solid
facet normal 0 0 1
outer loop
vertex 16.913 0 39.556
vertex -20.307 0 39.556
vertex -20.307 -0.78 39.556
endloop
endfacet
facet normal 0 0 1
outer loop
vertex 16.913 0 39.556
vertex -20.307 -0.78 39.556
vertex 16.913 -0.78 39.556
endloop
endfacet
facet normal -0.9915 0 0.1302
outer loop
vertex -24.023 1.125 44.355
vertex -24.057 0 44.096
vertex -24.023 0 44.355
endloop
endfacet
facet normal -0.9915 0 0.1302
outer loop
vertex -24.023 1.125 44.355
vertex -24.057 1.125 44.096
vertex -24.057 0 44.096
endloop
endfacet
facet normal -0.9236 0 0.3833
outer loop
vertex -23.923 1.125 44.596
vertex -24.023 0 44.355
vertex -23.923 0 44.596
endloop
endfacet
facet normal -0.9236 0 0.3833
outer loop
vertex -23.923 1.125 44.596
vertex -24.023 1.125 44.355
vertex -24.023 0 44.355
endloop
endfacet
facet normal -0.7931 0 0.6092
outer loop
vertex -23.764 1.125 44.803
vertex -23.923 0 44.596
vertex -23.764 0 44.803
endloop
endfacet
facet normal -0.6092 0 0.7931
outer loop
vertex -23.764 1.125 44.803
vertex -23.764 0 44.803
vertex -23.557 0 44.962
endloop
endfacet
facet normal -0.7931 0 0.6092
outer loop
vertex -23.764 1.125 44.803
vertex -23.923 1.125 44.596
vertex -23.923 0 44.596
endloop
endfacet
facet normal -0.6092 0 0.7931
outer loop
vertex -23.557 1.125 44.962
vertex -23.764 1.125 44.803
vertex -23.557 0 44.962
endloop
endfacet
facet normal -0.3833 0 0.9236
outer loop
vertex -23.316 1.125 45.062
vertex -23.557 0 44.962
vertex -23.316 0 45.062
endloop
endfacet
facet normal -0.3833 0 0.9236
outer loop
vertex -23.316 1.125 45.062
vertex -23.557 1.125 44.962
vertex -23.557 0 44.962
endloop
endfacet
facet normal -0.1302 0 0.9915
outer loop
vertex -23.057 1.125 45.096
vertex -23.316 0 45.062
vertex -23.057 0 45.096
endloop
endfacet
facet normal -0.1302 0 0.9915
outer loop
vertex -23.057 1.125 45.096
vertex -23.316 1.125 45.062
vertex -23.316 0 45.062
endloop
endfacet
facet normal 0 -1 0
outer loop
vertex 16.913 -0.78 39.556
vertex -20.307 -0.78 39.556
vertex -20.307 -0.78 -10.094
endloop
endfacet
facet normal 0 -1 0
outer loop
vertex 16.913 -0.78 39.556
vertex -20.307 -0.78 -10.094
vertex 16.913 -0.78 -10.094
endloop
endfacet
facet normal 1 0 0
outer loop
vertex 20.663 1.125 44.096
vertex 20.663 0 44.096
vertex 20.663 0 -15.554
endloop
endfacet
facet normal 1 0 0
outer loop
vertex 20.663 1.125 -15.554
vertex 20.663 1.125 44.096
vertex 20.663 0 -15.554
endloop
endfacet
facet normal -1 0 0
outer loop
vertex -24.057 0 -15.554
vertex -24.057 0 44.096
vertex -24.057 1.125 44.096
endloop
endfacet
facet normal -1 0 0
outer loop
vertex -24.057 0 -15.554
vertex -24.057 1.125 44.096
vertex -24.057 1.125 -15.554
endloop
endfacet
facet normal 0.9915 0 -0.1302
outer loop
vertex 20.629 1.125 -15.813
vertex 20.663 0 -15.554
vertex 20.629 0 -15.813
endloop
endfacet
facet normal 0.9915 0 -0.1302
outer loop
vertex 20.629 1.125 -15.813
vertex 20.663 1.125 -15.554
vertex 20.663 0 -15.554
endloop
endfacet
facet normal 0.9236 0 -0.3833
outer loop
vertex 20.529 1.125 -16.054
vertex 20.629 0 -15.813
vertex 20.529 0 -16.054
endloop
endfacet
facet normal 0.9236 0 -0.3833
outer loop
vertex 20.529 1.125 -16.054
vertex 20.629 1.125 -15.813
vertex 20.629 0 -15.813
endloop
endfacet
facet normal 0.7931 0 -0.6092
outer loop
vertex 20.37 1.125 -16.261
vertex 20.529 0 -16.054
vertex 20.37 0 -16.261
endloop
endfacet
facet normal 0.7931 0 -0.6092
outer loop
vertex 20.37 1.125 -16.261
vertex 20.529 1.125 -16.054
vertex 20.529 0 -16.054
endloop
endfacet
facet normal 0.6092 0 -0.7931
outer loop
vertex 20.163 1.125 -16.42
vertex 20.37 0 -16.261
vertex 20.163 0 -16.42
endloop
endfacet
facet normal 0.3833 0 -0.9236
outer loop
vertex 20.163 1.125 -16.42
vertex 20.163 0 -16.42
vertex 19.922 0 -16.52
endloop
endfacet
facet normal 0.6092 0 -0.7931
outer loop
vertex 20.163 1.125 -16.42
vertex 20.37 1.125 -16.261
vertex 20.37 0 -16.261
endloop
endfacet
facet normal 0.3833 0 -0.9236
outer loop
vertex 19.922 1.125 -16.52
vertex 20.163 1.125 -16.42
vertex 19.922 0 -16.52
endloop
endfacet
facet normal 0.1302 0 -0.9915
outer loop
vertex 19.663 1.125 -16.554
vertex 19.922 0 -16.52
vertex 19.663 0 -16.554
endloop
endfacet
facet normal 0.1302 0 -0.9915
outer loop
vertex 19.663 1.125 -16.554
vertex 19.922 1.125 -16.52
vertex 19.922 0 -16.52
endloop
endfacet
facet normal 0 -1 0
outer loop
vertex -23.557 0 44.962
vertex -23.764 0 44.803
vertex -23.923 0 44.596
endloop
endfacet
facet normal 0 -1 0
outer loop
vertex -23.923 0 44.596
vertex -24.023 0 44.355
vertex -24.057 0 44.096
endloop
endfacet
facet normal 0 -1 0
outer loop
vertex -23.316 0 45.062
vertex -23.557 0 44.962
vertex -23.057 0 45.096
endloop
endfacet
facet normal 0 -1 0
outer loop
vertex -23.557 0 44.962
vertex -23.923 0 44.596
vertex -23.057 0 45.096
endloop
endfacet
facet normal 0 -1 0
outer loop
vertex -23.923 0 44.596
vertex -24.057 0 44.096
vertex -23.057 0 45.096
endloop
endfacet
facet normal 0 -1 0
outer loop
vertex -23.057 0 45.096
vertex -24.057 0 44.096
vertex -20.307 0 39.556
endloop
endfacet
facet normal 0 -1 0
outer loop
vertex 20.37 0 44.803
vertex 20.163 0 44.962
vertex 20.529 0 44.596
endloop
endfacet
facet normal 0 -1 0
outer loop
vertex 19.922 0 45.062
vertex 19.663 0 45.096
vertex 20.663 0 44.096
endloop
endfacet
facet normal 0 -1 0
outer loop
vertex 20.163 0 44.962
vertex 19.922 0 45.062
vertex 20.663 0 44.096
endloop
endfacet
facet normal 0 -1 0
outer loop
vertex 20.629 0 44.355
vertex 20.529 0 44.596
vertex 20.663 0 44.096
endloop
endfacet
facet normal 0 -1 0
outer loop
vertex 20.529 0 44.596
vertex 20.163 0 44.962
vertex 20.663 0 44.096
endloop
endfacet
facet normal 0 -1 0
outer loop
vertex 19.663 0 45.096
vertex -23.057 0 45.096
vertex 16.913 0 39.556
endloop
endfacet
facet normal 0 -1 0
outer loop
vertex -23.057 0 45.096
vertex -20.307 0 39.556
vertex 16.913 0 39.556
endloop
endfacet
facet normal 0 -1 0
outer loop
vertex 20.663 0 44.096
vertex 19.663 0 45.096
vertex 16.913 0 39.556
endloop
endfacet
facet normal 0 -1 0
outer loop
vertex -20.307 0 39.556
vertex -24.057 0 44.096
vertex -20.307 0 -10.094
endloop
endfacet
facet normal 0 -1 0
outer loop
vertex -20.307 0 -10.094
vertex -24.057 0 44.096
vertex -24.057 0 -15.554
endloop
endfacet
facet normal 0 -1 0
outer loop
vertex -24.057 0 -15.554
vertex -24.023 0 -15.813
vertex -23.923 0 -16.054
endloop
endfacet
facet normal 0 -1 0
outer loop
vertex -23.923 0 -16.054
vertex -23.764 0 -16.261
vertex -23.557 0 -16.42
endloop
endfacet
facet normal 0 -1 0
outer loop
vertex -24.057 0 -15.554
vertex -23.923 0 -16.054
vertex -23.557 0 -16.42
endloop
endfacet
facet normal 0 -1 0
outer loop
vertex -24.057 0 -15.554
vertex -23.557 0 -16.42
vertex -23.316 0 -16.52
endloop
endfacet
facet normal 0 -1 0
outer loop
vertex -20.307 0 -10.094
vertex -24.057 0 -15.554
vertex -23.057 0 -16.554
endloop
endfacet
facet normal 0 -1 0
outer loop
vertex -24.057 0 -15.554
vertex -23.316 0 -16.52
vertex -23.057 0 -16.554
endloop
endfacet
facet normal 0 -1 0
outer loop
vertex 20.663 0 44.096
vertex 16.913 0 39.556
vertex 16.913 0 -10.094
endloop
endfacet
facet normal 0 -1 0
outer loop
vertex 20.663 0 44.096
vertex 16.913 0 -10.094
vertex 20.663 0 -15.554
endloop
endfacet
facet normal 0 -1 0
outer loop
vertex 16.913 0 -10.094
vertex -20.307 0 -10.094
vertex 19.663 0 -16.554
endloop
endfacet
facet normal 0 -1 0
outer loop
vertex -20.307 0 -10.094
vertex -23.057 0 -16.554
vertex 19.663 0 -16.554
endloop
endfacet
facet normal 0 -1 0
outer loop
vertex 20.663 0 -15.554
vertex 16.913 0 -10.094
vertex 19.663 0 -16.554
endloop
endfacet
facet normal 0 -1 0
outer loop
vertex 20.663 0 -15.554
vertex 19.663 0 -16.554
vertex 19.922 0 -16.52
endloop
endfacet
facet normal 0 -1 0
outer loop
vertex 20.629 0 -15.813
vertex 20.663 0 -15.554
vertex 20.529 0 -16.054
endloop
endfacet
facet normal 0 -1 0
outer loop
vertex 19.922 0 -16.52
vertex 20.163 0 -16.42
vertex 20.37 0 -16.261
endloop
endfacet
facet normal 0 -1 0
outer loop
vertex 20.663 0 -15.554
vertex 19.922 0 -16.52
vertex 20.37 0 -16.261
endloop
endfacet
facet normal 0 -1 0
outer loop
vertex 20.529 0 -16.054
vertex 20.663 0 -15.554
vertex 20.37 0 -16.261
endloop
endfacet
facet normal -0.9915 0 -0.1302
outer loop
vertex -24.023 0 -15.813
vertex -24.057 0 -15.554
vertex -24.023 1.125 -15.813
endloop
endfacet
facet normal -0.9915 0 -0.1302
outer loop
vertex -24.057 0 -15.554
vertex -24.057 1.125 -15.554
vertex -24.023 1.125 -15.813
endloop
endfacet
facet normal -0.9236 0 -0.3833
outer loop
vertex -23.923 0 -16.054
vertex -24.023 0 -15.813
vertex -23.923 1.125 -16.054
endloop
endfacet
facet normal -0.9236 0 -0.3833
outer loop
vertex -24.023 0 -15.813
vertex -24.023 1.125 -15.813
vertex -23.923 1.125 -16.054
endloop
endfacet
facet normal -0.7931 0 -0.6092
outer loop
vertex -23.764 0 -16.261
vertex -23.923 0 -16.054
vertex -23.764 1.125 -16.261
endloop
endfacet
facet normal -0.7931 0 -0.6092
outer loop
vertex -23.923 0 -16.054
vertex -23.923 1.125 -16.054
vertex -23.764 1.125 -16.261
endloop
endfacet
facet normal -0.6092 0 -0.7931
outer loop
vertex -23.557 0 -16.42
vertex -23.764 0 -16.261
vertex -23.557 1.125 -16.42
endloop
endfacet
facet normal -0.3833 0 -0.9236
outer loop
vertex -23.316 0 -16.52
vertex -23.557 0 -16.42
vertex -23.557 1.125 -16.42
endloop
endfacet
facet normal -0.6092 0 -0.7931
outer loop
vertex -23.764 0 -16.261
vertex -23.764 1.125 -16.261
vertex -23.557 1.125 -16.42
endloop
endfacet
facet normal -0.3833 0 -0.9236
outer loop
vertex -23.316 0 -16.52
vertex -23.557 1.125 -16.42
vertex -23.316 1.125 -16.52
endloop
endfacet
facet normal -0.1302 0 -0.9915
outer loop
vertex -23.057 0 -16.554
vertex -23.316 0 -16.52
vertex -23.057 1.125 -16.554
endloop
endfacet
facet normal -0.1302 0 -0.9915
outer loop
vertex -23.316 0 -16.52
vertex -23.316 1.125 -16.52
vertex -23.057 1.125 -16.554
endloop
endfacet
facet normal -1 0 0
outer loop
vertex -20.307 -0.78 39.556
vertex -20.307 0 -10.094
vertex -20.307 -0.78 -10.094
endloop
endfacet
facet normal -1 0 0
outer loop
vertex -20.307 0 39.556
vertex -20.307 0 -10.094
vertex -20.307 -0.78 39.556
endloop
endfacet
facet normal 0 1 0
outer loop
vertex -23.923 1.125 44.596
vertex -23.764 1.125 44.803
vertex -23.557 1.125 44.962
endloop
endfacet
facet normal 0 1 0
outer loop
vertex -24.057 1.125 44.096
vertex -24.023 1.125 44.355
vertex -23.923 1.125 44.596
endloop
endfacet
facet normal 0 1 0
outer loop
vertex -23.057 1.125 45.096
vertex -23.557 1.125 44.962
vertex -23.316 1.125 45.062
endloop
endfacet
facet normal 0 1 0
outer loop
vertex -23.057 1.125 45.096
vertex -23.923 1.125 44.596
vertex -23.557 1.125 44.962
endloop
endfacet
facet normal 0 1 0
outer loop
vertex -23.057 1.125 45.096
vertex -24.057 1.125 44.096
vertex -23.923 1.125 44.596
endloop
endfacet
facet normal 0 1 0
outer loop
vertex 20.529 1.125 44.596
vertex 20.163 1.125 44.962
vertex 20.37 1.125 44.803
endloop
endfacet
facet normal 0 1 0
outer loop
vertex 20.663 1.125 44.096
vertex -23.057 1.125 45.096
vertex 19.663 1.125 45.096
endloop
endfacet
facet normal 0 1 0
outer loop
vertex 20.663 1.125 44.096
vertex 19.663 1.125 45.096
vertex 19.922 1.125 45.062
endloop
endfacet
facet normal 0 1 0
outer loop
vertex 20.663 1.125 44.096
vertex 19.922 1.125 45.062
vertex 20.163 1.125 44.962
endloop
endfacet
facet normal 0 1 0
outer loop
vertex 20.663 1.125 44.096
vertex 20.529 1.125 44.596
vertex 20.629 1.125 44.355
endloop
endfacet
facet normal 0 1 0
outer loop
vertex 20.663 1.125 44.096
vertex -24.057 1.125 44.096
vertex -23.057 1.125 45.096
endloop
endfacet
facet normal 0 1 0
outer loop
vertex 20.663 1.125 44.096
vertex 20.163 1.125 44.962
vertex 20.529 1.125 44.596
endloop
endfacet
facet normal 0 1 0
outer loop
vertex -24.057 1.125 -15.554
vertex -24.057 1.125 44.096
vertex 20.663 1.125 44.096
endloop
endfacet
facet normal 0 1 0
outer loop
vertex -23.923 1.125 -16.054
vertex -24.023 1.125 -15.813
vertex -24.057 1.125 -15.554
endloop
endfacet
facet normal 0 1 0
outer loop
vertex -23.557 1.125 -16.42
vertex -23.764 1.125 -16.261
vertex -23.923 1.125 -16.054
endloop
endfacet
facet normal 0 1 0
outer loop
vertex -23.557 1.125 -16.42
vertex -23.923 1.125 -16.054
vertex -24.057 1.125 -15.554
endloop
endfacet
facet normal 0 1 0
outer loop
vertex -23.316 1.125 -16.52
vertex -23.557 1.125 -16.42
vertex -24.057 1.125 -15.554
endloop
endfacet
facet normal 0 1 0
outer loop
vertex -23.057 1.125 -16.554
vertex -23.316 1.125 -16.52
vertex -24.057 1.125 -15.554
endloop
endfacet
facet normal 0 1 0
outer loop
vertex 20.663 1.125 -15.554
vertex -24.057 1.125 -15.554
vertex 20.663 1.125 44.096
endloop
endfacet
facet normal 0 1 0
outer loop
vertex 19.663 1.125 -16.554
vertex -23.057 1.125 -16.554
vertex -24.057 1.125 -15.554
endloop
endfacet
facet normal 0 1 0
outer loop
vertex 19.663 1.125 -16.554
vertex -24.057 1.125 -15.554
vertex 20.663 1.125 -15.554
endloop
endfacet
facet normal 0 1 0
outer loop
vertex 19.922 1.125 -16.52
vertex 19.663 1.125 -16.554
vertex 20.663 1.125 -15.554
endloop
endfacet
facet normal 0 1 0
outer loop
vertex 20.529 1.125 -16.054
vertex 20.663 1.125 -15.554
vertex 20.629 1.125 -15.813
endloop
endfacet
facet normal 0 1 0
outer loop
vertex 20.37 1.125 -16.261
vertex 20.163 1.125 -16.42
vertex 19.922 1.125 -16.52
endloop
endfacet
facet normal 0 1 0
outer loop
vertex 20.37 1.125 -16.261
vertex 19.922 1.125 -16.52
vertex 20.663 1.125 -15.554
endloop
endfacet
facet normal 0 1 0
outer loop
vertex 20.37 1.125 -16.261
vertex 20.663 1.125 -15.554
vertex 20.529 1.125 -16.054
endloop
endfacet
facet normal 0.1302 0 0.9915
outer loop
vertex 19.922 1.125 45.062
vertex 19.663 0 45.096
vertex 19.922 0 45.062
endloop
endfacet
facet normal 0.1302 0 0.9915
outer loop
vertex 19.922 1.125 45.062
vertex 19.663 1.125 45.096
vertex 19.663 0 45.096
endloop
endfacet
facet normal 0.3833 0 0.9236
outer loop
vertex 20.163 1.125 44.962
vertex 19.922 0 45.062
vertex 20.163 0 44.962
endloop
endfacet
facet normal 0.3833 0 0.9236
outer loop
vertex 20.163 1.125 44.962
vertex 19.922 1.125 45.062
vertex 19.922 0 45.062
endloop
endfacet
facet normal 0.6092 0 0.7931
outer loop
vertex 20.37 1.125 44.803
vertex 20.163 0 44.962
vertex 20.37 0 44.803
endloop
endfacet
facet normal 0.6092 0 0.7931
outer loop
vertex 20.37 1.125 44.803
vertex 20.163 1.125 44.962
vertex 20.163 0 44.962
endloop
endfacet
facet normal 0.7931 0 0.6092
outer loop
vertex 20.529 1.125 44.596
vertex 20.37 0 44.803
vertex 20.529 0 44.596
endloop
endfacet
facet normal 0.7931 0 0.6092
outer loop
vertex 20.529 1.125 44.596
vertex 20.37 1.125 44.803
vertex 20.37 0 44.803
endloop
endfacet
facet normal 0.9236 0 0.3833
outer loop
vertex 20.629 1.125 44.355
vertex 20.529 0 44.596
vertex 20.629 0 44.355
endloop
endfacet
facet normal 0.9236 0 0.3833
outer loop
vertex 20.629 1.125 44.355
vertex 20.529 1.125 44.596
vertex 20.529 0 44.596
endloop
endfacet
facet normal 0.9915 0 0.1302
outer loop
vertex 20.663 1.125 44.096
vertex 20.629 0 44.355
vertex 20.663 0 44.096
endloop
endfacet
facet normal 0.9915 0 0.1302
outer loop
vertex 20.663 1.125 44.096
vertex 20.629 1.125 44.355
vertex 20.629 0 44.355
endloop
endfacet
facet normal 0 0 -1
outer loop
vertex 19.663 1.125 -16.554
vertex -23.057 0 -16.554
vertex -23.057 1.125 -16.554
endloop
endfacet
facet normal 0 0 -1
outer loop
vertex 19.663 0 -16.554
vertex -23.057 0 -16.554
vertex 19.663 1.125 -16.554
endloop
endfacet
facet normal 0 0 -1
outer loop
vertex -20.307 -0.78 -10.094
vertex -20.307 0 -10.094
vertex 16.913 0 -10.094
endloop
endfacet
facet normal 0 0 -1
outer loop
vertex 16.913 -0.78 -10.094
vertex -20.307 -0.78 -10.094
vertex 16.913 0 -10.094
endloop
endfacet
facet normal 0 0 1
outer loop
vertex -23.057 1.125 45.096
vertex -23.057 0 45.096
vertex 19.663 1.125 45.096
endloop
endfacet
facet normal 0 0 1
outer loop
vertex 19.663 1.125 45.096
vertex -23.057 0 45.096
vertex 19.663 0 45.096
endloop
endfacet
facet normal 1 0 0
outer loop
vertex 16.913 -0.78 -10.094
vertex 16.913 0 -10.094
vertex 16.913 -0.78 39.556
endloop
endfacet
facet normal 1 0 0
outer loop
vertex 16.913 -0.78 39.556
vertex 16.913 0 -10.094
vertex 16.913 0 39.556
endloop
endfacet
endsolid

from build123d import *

# Parameters (mm, degrees)
SKETCH_1_W      = 44.72
SKETCH_1_H      = 61.65
EXTRUDE_1_DEPTH = 1.125
FILLET_1_R      = 1
SKETCH_2_W      = 37.22
SKETCH_2_H      = 49.65
EXTRUDE_2_DEPTH = 0.78


with BuildPart() as part:
    # 草图1 → 凸台-拉伸1 (new body)
    with BuildSketch(Plane(origin=(0, 0, 0), x_dir=(1, 0, 0), z_dir=(0, 1, 0))):
        with Locations((-1.696923077, -14.271057692)):
            Rectangle(SKETCH_1_W, SKETCH_1_H)
    extrude(amount=EXTRUDE_1_DEPTH)

    # 圆角1
    fillet_1_edges = [part.edges().sort_by_distance(p)[0] for p in [
        (-24.056923077, 0.5625, -16.553942308),
        (20.663076923, 0.5625, -16.553942308),
        (20.663076923, 0.5625, 45.096057692),
        (-24.056923077, 0.5625, 45.096057692),
    ]]
    fillet(fillet_1_edges, radius=FILLET_1_R)

    # 草图2 → 凸台-拉伸2 (add)
    with BuildSketch(Plane.XZ):
        with Locations((-1.696923077, 14.731057692)):
            Rectangle(SKETCH_2_W, SKETCH_2_H)
    extrude(amount=EXTRUDE_2_DEPTH)


solid = part.part
